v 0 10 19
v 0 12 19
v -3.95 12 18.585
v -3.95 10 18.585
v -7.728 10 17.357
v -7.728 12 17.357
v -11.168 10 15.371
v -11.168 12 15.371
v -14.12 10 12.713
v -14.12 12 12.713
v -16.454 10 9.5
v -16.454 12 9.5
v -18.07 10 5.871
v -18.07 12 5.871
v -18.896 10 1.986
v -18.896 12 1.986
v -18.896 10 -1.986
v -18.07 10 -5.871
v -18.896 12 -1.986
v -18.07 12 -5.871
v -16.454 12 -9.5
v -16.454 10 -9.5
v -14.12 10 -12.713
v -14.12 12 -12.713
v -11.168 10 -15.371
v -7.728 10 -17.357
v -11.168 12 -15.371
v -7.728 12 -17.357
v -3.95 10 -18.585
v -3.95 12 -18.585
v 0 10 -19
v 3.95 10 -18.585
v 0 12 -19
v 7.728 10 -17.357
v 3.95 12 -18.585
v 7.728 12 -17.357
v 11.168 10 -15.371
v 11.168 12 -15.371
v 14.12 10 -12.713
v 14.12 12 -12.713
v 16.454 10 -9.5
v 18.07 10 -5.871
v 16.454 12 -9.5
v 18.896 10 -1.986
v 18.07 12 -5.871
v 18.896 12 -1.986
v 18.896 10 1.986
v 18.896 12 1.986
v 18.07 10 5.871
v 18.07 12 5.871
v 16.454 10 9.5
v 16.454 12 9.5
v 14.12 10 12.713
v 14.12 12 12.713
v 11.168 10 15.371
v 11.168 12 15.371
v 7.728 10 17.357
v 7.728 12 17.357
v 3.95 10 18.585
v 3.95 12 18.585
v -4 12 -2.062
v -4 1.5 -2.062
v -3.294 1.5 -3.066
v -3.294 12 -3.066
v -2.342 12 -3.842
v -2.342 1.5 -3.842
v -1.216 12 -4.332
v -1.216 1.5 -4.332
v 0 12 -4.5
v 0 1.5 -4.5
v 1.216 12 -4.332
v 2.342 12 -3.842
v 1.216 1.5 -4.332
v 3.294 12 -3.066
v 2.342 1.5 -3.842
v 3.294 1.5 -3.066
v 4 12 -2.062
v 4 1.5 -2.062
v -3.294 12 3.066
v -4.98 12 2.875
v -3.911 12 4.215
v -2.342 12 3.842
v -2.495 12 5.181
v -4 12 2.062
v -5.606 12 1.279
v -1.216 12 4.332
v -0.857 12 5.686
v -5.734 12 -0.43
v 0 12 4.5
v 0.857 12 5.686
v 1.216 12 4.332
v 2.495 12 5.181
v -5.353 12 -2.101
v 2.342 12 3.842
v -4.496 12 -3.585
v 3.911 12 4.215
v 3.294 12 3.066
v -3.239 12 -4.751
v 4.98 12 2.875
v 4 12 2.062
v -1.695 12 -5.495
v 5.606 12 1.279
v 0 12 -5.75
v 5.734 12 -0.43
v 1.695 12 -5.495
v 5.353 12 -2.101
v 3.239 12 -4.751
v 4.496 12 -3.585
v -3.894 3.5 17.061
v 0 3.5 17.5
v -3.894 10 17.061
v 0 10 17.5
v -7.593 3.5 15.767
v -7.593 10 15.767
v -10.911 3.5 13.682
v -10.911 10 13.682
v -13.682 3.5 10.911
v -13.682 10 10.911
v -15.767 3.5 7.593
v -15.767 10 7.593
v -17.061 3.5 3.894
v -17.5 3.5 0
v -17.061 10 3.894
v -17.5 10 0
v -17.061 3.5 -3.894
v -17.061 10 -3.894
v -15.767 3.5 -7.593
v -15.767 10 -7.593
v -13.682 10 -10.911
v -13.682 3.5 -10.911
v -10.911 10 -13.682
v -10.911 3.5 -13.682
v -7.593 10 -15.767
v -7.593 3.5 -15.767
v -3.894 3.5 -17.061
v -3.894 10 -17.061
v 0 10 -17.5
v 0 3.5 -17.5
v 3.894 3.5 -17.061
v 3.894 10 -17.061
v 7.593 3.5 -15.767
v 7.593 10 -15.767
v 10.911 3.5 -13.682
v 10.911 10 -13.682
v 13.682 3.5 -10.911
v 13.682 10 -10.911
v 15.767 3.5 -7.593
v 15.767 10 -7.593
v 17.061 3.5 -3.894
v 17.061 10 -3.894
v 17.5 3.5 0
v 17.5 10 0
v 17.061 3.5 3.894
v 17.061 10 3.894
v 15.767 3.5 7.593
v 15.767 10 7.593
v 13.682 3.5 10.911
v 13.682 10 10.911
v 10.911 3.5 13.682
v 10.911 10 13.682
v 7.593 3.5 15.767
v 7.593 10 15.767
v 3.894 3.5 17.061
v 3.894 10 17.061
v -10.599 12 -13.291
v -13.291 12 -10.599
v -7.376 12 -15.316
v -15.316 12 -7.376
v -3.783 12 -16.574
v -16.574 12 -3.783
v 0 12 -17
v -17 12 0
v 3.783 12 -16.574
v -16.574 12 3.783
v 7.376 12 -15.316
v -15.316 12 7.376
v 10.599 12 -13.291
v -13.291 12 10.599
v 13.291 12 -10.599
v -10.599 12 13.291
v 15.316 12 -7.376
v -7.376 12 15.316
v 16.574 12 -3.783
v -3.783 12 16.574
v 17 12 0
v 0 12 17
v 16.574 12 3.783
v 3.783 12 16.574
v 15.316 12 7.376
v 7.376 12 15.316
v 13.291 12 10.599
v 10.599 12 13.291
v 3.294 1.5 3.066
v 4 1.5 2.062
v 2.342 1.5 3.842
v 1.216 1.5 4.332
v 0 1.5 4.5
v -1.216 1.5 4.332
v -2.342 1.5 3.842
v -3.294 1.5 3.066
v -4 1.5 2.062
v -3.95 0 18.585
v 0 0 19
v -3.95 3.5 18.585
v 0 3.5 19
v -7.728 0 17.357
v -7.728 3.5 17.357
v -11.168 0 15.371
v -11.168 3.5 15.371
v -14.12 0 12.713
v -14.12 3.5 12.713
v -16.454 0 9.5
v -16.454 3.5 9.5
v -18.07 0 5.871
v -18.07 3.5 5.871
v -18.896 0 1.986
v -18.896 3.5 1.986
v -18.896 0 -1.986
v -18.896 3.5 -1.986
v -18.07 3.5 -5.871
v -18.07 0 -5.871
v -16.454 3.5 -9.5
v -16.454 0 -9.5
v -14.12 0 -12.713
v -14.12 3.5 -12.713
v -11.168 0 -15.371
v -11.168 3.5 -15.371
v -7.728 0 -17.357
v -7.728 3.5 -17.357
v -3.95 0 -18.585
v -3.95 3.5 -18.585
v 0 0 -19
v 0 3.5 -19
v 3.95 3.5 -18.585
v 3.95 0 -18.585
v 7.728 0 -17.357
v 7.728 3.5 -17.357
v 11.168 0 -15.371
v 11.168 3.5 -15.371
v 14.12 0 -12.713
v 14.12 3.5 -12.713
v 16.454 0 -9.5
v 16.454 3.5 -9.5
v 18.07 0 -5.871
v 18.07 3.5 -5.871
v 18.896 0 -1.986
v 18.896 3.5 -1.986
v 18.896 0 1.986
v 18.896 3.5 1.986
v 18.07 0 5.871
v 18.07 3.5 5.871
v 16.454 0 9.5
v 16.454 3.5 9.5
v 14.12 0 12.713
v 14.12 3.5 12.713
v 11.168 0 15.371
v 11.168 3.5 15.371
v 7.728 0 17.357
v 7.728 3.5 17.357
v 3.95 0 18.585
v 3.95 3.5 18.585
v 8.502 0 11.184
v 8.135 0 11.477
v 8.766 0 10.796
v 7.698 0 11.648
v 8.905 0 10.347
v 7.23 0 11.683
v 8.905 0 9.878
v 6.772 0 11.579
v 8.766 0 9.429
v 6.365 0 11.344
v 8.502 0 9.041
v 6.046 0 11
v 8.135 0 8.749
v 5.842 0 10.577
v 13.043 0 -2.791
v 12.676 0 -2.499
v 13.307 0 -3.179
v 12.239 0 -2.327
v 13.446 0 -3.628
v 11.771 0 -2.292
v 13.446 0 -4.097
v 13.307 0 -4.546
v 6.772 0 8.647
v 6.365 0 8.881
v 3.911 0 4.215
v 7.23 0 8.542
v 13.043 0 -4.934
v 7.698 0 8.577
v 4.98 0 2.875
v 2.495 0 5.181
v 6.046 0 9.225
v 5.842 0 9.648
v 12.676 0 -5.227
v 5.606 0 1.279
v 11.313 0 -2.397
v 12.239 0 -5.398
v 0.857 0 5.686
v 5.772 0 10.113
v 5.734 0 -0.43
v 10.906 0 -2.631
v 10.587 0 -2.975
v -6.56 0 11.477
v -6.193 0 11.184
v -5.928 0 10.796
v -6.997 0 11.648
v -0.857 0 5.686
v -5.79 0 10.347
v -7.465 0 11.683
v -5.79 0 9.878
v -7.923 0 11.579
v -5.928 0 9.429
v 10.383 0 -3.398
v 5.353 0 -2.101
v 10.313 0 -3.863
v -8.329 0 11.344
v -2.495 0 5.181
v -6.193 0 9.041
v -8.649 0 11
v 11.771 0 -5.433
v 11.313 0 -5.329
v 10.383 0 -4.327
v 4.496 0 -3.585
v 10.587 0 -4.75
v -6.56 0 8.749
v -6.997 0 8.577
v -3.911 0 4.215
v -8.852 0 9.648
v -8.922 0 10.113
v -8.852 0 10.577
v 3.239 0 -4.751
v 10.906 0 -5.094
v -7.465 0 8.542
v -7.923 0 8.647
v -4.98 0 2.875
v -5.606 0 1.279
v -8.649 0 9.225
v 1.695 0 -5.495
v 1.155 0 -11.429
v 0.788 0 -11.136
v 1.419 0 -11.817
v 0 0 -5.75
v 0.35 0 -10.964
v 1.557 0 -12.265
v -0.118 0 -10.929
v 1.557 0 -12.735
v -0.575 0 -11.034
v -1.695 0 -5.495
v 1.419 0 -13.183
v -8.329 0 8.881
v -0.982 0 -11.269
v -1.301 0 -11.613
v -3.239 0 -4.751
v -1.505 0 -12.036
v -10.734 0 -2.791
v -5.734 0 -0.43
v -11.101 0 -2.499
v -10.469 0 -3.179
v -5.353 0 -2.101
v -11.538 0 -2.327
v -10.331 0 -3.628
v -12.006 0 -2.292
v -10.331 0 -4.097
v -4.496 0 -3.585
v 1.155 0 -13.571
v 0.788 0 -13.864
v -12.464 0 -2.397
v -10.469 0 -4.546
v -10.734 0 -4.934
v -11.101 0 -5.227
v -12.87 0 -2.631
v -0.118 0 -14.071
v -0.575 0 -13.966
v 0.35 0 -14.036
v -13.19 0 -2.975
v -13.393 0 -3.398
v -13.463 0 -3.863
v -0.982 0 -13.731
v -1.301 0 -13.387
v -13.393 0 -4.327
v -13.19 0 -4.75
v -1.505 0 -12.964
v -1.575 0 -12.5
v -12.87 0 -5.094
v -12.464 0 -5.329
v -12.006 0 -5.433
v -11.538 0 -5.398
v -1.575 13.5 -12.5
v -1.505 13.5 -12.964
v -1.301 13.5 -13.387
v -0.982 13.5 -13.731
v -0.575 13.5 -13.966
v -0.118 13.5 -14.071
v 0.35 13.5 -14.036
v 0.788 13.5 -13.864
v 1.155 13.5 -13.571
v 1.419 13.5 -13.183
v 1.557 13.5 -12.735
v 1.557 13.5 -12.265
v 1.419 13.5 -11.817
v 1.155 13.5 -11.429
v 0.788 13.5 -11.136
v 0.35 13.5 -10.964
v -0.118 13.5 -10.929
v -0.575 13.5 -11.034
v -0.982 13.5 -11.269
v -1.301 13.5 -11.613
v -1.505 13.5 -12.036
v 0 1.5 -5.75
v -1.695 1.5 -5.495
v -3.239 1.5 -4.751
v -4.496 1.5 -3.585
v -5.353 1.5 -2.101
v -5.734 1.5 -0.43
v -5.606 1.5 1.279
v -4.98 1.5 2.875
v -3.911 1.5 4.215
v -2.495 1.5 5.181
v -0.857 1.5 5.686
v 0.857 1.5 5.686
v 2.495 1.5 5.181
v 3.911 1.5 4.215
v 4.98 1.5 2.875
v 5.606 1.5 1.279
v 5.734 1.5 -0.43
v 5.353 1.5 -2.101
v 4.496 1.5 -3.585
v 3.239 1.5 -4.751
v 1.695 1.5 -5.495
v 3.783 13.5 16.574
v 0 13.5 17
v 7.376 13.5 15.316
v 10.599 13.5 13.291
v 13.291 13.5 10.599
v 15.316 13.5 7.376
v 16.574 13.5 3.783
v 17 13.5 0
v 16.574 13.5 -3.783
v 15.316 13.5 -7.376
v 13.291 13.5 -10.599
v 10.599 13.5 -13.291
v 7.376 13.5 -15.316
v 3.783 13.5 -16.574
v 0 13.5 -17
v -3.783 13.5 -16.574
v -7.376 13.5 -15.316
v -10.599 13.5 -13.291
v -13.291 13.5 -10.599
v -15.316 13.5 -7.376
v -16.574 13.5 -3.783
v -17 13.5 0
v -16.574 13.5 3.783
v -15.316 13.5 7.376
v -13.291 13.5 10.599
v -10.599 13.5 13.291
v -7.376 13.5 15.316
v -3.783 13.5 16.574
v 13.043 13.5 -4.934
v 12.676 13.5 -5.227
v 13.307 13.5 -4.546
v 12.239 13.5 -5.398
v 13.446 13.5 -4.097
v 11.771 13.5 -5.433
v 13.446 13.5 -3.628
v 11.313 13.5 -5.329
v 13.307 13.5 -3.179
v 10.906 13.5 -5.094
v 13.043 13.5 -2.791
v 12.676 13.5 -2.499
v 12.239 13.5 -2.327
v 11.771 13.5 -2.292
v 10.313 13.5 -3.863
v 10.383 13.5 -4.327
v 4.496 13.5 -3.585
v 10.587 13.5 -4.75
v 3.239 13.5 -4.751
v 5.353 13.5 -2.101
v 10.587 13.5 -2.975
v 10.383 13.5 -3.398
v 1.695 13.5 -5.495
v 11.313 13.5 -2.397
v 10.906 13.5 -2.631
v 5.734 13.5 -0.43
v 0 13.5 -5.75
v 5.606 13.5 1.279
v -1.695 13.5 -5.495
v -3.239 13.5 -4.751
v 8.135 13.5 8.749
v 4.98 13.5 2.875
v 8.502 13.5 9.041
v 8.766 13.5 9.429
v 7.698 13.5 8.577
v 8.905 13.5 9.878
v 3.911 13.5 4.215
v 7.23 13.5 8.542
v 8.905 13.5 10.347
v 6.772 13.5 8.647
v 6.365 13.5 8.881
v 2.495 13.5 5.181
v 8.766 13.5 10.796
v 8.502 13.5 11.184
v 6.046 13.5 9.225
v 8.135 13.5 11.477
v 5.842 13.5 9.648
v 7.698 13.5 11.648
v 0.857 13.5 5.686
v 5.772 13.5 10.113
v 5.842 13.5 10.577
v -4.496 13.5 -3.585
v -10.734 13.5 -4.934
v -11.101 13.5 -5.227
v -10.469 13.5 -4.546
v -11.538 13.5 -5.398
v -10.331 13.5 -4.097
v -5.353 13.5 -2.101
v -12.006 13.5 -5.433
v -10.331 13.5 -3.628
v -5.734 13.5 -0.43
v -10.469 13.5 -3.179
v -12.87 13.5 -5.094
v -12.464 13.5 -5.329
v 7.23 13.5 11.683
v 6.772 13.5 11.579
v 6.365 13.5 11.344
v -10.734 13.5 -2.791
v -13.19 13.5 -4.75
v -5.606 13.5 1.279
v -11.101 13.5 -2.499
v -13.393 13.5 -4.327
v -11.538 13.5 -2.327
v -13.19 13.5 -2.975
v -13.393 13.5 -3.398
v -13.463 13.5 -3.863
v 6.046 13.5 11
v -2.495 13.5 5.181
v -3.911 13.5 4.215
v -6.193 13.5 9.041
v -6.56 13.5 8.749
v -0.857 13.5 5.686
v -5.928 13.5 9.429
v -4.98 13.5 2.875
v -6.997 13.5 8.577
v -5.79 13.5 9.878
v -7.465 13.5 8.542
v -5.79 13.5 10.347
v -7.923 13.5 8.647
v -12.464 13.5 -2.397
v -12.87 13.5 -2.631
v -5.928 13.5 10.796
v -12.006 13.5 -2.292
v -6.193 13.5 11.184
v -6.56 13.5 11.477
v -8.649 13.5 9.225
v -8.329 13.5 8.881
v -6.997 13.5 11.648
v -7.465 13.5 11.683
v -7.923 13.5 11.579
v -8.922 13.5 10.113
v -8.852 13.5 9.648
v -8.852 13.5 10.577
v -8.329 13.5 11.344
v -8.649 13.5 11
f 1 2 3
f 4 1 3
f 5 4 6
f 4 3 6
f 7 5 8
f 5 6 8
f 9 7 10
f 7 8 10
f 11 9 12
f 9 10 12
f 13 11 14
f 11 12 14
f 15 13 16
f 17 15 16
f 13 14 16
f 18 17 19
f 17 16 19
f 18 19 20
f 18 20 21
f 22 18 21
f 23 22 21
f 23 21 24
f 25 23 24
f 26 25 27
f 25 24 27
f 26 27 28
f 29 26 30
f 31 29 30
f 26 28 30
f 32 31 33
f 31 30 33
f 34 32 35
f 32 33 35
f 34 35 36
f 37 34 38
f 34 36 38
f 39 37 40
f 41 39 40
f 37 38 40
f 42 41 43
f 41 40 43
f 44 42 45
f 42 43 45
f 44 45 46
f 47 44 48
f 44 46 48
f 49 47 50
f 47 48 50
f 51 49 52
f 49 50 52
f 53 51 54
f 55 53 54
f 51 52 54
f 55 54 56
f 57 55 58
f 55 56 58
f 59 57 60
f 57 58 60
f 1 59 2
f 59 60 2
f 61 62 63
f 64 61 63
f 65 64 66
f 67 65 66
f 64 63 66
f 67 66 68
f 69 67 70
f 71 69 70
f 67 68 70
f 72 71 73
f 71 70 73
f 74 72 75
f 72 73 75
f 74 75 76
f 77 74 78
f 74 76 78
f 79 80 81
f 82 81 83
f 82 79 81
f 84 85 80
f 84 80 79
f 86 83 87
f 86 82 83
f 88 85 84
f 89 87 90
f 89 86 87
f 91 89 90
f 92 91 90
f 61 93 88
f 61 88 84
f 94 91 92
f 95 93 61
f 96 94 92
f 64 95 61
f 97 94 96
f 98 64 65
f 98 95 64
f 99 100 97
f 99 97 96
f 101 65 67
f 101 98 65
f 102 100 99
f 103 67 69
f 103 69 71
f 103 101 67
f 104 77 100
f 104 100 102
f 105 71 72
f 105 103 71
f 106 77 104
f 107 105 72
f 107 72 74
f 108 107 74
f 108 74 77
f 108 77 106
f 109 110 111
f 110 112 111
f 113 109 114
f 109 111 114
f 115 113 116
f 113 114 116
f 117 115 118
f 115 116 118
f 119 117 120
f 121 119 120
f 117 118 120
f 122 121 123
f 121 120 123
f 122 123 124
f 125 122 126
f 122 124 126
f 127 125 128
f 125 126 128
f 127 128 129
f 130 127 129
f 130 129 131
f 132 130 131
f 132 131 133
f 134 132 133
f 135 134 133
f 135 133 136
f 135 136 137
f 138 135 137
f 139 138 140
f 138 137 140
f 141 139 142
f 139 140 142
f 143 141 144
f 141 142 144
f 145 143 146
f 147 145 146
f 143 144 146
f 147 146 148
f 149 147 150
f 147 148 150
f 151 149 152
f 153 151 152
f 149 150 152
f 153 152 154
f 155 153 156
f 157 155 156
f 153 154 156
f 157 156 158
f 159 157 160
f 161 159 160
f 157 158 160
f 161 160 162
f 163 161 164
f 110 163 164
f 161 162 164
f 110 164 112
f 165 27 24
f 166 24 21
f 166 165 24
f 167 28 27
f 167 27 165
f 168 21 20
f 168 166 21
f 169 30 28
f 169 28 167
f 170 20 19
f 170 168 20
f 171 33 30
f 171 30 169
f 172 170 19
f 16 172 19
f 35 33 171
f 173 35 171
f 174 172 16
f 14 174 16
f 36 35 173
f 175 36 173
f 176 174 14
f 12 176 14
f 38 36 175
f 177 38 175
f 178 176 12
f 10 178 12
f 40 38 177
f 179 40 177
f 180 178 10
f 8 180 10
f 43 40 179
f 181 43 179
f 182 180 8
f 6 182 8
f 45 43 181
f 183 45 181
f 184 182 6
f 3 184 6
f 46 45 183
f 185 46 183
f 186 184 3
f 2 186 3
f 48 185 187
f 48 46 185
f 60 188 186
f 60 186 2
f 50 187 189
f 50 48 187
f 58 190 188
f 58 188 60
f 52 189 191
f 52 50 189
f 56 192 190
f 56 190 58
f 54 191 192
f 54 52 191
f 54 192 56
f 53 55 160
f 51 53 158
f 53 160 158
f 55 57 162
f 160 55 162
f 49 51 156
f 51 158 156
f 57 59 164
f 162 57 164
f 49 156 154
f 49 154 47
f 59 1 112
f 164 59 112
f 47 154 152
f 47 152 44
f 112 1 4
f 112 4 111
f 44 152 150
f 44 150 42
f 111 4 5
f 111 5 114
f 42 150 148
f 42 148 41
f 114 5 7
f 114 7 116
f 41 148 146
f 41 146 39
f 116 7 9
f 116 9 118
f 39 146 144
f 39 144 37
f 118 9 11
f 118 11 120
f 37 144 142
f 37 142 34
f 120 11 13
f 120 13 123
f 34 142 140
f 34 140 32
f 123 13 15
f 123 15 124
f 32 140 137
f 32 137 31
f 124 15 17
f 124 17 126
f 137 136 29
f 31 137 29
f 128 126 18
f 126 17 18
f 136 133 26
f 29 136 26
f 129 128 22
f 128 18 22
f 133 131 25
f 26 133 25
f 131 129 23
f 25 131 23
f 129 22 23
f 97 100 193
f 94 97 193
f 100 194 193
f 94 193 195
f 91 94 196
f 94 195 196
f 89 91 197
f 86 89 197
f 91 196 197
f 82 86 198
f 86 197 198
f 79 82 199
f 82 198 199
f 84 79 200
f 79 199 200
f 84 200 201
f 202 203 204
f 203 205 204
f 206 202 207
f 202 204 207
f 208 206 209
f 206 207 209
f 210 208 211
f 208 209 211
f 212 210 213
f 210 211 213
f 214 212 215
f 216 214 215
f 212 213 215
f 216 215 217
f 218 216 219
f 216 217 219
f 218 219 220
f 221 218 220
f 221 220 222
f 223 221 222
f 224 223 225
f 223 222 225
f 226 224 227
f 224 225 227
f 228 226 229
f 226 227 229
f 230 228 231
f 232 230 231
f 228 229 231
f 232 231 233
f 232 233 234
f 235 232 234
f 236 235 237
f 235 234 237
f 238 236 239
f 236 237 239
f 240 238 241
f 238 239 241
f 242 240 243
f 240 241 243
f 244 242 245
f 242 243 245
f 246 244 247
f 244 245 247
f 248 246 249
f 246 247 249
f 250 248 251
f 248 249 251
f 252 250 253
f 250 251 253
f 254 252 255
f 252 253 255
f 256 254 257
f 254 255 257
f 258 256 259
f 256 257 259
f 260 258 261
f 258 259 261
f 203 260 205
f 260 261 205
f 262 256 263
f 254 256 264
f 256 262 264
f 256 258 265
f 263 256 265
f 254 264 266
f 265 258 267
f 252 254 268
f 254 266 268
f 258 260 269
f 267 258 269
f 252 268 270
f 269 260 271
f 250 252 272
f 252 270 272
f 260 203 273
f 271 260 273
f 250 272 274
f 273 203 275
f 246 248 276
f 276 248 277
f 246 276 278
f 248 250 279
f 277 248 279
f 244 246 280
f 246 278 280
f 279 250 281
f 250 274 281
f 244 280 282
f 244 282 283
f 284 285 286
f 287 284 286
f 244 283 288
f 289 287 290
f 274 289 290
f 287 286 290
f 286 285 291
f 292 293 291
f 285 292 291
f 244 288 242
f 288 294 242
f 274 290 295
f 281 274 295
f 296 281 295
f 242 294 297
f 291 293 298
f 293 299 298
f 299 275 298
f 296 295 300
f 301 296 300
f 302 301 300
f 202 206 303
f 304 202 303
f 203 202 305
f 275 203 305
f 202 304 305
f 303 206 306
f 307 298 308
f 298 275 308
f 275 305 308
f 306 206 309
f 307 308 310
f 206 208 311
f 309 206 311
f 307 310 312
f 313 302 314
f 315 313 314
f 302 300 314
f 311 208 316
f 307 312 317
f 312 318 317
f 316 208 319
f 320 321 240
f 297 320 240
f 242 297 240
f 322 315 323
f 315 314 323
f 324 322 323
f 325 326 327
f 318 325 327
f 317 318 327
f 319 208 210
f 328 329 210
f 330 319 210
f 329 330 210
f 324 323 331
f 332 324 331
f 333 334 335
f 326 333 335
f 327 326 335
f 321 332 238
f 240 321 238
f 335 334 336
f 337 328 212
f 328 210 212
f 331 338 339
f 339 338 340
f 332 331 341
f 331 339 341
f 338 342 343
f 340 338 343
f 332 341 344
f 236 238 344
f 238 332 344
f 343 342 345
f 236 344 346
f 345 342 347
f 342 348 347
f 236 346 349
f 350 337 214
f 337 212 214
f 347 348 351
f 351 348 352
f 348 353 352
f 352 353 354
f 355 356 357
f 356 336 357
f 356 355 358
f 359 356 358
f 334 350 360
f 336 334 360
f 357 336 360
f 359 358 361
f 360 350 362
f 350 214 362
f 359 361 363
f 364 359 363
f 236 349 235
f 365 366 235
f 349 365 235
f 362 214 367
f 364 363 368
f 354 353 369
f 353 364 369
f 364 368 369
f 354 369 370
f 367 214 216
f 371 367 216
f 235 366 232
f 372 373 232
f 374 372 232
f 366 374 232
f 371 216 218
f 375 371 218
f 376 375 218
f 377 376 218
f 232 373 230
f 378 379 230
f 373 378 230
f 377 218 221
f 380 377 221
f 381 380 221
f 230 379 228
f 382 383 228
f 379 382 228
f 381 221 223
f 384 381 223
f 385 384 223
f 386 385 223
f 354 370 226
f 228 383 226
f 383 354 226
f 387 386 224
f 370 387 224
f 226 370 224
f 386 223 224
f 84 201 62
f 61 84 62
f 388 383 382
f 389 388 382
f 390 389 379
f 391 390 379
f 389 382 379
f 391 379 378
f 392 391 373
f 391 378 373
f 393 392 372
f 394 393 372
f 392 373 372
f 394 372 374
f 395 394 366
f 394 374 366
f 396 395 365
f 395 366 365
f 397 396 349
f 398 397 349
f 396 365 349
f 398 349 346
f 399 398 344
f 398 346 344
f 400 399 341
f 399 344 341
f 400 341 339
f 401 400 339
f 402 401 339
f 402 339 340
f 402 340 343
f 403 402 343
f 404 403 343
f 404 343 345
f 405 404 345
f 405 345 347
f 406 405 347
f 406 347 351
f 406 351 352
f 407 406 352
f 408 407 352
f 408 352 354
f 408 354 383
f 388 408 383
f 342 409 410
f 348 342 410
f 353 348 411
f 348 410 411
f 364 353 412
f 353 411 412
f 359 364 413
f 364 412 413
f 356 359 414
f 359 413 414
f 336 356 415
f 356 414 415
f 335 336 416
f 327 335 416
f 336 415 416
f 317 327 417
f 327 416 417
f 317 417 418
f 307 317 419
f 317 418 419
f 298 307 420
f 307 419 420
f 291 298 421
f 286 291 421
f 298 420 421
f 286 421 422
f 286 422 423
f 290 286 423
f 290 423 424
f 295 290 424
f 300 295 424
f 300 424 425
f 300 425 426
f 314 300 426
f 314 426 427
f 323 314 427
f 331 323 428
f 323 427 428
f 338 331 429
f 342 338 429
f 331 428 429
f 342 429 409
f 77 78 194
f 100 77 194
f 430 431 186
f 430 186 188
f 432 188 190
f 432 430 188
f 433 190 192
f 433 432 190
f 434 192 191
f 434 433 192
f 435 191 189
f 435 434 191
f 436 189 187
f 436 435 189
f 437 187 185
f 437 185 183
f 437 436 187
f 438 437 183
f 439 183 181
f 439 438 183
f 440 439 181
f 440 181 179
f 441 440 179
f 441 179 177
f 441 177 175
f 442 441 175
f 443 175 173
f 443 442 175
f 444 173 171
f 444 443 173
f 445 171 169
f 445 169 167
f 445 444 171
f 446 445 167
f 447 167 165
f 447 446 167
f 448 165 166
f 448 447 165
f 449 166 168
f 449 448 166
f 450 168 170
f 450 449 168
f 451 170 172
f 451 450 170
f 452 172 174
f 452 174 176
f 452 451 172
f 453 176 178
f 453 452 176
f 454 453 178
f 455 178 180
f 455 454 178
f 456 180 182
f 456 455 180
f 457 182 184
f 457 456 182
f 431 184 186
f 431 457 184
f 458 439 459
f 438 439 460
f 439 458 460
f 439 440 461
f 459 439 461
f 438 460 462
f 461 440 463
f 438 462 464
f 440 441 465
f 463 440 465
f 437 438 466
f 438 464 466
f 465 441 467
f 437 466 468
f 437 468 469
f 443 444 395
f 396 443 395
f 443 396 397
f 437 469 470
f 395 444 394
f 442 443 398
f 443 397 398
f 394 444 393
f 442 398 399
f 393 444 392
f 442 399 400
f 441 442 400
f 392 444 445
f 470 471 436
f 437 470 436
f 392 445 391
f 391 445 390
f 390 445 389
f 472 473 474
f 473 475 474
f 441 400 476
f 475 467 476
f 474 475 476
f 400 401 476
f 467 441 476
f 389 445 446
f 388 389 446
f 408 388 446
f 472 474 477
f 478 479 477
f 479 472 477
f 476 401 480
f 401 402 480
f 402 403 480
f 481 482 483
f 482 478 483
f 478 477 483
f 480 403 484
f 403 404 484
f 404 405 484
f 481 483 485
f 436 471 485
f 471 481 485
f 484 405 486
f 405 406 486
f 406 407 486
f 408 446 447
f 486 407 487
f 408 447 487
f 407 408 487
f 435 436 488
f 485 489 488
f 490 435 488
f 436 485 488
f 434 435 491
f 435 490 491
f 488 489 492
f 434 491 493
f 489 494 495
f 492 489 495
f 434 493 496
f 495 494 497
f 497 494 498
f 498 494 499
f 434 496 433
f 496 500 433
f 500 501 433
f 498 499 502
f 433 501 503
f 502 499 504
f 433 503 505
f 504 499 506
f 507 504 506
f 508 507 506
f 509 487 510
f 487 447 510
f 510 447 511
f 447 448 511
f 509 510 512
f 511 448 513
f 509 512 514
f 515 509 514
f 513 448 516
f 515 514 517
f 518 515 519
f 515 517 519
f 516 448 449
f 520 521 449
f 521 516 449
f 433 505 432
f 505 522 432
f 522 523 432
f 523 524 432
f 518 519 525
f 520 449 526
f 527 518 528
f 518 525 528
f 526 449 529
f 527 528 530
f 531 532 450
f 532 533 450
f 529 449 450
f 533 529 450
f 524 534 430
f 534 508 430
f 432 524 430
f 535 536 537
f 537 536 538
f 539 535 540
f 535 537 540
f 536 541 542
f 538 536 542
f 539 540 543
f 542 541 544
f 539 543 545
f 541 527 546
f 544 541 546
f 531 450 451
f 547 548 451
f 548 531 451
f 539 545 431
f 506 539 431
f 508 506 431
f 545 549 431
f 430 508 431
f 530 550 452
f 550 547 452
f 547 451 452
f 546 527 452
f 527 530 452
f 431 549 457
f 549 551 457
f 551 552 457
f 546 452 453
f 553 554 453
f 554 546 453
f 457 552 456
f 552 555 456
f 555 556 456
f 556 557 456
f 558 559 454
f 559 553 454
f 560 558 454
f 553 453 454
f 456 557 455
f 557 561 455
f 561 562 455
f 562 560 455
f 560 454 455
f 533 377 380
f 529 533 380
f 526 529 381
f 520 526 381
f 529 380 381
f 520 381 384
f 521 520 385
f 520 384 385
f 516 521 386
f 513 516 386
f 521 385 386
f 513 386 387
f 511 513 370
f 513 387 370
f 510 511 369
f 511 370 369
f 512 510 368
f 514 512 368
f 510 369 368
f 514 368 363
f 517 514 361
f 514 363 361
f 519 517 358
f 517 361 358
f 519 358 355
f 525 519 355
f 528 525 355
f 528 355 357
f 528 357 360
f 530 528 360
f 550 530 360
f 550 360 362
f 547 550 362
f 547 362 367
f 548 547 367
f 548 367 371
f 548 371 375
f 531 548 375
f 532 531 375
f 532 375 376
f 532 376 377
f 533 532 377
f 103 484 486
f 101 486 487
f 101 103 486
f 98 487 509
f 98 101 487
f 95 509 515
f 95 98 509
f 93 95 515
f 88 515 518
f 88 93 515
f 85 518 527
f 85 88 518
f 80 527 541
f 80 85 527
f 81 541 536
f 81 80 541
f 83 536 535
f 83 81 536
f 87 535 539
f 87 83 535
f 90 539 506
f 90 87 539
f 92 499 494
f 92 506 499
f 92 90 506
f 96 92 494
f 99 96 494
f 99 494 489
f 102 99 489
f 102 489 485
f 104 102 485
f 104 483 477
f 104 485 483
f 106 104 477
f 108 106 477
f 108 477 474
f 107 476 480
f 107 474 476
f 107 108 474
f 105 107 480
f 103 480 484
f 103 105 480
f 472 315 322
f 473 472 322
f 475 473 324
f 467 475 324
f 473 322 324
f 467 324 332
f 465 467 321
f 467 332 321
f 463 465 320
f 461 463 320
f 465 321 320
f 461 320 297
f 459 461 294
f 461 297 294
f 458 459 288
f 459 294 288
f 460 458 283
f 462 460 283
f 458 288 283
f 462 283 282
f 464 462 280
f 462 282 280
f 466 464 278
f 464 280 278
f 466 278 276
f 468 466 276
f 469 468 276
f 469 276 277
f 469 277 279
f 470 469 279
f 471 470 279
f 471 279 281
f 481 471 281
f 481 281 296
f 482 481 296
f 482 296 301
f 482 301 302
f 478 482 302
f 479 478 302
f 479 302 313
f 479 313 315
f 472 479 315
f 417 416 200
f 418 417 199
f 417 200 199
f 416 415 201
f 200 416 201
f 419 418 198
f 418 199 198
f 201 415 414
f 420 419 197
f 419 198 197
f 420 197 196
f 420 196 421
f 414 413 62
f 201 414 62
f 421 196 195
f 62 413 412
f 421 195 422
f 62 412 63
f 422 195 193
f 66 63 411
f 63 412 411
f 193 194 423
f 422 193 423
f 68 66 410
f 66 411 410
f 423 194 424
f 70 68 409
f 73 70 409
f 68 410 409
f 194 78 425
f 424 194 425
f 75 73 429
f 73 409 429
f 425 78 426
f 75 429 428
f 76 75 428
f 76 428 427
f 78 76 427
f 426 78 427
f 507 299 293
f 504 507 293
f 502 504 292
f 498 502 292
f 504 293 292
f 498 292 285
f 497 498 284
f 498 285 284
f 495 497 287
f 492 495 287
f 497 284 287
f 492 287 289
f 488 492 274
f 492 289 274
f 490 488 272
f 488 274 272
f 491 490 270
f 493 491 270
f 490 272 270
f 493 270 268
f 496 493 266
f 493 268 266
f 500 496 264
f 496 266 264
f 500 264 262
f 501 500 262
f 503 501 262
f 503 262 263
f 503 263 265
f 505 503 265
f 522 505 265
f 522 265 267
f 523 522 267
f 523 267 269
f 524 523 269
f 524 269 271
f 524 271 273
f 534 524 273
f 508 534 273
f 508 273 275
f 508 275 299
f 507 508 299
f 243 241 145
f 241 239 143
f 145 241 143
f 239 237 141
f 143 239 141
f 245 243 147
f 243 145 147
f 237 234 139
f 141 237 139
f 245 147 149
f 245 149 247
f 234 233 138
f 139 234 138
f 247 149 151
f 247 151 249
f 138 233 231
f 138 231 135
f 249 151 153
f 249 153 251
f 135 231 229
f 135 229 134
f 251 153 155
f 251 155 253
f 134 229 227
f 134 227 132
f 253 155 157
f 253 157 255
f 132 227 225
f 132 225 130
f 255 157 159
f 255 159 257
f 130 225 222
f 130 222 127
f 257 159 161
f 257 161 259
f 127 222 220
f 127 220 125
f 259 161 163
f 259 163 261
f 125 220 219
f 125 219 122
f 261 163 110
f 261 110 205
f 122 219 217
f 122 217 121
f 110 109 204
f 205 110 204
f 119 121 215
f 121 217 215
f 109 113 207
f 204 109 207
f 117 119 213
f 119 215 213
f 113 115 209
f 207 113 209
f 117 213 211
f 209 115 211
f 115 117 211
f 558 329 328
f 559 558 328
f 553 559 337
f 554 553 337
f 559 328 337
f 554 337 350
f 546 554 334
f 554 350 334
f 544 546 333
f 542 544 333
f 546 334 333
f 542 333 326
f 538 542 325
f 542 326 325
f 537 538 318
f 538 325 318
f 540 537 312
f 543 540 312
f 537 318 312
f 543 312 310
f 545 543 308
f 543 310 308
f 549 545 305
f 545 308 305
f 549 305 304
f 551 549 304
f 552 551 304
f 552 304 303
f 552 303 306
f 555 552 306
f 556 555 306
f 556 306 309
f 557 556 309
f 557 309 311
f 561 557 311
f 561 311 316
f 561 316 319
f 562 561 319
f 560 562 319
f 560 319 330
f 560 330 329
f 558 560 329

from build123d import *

# Parameters (mm, degrees)
F_9_0_9_DIAMETER_HOLE1_D     = 9
CUT_EXTRUDE1_DEPTH           = 31.070749908
CUT_EXTRUDE1_DEPTH_BACK      = 1.5
SKETCH6_R                    = 5.75
CUT_EXTRUDE2_START           = -12
SKETCH6_2_R                  = 5.75
CUT_EXTRUDE2_DEPTH           = 1.5
BOSS_EXTRUDE1_START          = -10.5
BOSS_EXTRUDE1_DEPTH          = 10.5
TAP_DRILL_FOR_M3_HELICOIL1_D = 3.15
SKETCH11_R                   = 19
SKETCH11_R_2                 = 17
CUT_EXTRUDE3_DEPTH           = 1.5


with BuildPart() as part:
    # Sketch1 → Revolve1 (revolve)
    with BuildSketch(Plane.XY, mode=Mode.PRIVATE) as revolve1_sk:
        Polygon((0, 0), (19, 0), (19, 3.5), (17.5, 3.5), (17.5, 10), (19, 10), (19, 13.5), (0, 13.5), align=None)
    revolve(revolve1_sk.sketch.rotate(Axis((0, 13.5, 0), (0, -1, 0)), 90), axis=Axis((0, 13.5, 0), (0, -1, 0)))

    # Ø9.0 (9) Diameter Hole1 (through all)
    with Locations(Plane(origin=(0, 13.5, 0), x_dir=(1, 0, 0), z_dir=(0, 1, 0))):
        with Locations((0, 0)):
            Hole(F_9_0_9_DIAMETER_HOLE1_D / 2)

    # Sketch6 → Cut-Extrude1 (cut, two sides: drawn at the far end of the back side and taken through both)
    with BuildSketch(Plane(origin=(0, 13.5, 0), x_dir=(1, 0, 0), z_dir=(0, 1, 0)).offset(-CUT_EXTRUDE1_DEPTH_BACK)):
        with Locations(Location((0, 0, 0), (0, 0, 90))):
            Circle(SKETCH6_R)
    extrude(amount=CUT_EXTRUDE1_DEPTH + CUT_EXTRUDE1_DEPTH_BACK, mode=Mode.SUBTRACT)

    # Sketch6<2> → Cut-Extrude2 (cut)
    with BuildSketch(Plane(origin=(0, 13.5, 0), x_dir=(1, 0, 0), z_dir=(0, 1, 0)).offset(CUT_EXTRUDE2_START)):
        with Locations(Location((0, 0, 0), (0, 0, 90))):
            Circle(SKETCH6_2_R)
    extrude(amount=-CUT_EXTRUDE2_DEPTH, mode=Mode.SUBTRACT)

    # Sketch7 → Boss-Extrude1 (add)
    with BuildSketch(Plane(origin=(0, 12, 0), x_dir=(1, 0, 0), z_dir=(0, 1, 0)).offset(BOSS_EXTRUDE1_START)):
        with BuildLine():
            ThreePointArc((-4, 2.061552813), (-4.5, 0), (-4, -2.061552813))
            Line((-4, -2.061552813), (-4, 2.061552813))
        make_face()
        with BuildLine():
            Line((4, 2.061552813), (4, -2.061552813))
            ThreePointArc((4, -2.061552813), (4.373213921, -1.060660172), (4.5, 0))
            ThreePointArc((4.5, 0), (4.373213921, 1.060660172), (4, 2.061552813))
        make_face()
    extrude(amount=BOSS_EXTRUDE1_DEPTH)

    # Tap Drill for M3 Helicoil1 (through all)
    with Locations(Plane(origin=(0, 13.5, 0), x_dir=(1, 0, 0), z_dir=(0, 1, 0))):
        with Locations((-11.888206454, 3.86271243), (0, 12.5), (11.888206454, 3.86271243), (7.347315654, -10.11271243), (-7.347315654, -10.11271243)):
            Hole(TAP_DRILL_FOR_M3_HELICOIL1_D / 2)

    # Sketch11 → Cut-Extrude3 (cut)
    with BuildSketch(Plane(origin=(0, 13.5, 0), x_dir=(1, 0, 0), z_dir=(0, 1, 0))):
        with Locations(Location((0, 0, 0), (0, 0, 270))):
            Circle(SKETCH11_R)
        with Locations(Location((0, 0, 0), (0, 0, 270))):
            Circle(SKETCH11_R_2, mode=Mode.SUBTRACT)
    extrude(amount=-CUT_EXTRUDE3_DEPTH, mode=Mode.SUBTRACT)


solid = part.part
